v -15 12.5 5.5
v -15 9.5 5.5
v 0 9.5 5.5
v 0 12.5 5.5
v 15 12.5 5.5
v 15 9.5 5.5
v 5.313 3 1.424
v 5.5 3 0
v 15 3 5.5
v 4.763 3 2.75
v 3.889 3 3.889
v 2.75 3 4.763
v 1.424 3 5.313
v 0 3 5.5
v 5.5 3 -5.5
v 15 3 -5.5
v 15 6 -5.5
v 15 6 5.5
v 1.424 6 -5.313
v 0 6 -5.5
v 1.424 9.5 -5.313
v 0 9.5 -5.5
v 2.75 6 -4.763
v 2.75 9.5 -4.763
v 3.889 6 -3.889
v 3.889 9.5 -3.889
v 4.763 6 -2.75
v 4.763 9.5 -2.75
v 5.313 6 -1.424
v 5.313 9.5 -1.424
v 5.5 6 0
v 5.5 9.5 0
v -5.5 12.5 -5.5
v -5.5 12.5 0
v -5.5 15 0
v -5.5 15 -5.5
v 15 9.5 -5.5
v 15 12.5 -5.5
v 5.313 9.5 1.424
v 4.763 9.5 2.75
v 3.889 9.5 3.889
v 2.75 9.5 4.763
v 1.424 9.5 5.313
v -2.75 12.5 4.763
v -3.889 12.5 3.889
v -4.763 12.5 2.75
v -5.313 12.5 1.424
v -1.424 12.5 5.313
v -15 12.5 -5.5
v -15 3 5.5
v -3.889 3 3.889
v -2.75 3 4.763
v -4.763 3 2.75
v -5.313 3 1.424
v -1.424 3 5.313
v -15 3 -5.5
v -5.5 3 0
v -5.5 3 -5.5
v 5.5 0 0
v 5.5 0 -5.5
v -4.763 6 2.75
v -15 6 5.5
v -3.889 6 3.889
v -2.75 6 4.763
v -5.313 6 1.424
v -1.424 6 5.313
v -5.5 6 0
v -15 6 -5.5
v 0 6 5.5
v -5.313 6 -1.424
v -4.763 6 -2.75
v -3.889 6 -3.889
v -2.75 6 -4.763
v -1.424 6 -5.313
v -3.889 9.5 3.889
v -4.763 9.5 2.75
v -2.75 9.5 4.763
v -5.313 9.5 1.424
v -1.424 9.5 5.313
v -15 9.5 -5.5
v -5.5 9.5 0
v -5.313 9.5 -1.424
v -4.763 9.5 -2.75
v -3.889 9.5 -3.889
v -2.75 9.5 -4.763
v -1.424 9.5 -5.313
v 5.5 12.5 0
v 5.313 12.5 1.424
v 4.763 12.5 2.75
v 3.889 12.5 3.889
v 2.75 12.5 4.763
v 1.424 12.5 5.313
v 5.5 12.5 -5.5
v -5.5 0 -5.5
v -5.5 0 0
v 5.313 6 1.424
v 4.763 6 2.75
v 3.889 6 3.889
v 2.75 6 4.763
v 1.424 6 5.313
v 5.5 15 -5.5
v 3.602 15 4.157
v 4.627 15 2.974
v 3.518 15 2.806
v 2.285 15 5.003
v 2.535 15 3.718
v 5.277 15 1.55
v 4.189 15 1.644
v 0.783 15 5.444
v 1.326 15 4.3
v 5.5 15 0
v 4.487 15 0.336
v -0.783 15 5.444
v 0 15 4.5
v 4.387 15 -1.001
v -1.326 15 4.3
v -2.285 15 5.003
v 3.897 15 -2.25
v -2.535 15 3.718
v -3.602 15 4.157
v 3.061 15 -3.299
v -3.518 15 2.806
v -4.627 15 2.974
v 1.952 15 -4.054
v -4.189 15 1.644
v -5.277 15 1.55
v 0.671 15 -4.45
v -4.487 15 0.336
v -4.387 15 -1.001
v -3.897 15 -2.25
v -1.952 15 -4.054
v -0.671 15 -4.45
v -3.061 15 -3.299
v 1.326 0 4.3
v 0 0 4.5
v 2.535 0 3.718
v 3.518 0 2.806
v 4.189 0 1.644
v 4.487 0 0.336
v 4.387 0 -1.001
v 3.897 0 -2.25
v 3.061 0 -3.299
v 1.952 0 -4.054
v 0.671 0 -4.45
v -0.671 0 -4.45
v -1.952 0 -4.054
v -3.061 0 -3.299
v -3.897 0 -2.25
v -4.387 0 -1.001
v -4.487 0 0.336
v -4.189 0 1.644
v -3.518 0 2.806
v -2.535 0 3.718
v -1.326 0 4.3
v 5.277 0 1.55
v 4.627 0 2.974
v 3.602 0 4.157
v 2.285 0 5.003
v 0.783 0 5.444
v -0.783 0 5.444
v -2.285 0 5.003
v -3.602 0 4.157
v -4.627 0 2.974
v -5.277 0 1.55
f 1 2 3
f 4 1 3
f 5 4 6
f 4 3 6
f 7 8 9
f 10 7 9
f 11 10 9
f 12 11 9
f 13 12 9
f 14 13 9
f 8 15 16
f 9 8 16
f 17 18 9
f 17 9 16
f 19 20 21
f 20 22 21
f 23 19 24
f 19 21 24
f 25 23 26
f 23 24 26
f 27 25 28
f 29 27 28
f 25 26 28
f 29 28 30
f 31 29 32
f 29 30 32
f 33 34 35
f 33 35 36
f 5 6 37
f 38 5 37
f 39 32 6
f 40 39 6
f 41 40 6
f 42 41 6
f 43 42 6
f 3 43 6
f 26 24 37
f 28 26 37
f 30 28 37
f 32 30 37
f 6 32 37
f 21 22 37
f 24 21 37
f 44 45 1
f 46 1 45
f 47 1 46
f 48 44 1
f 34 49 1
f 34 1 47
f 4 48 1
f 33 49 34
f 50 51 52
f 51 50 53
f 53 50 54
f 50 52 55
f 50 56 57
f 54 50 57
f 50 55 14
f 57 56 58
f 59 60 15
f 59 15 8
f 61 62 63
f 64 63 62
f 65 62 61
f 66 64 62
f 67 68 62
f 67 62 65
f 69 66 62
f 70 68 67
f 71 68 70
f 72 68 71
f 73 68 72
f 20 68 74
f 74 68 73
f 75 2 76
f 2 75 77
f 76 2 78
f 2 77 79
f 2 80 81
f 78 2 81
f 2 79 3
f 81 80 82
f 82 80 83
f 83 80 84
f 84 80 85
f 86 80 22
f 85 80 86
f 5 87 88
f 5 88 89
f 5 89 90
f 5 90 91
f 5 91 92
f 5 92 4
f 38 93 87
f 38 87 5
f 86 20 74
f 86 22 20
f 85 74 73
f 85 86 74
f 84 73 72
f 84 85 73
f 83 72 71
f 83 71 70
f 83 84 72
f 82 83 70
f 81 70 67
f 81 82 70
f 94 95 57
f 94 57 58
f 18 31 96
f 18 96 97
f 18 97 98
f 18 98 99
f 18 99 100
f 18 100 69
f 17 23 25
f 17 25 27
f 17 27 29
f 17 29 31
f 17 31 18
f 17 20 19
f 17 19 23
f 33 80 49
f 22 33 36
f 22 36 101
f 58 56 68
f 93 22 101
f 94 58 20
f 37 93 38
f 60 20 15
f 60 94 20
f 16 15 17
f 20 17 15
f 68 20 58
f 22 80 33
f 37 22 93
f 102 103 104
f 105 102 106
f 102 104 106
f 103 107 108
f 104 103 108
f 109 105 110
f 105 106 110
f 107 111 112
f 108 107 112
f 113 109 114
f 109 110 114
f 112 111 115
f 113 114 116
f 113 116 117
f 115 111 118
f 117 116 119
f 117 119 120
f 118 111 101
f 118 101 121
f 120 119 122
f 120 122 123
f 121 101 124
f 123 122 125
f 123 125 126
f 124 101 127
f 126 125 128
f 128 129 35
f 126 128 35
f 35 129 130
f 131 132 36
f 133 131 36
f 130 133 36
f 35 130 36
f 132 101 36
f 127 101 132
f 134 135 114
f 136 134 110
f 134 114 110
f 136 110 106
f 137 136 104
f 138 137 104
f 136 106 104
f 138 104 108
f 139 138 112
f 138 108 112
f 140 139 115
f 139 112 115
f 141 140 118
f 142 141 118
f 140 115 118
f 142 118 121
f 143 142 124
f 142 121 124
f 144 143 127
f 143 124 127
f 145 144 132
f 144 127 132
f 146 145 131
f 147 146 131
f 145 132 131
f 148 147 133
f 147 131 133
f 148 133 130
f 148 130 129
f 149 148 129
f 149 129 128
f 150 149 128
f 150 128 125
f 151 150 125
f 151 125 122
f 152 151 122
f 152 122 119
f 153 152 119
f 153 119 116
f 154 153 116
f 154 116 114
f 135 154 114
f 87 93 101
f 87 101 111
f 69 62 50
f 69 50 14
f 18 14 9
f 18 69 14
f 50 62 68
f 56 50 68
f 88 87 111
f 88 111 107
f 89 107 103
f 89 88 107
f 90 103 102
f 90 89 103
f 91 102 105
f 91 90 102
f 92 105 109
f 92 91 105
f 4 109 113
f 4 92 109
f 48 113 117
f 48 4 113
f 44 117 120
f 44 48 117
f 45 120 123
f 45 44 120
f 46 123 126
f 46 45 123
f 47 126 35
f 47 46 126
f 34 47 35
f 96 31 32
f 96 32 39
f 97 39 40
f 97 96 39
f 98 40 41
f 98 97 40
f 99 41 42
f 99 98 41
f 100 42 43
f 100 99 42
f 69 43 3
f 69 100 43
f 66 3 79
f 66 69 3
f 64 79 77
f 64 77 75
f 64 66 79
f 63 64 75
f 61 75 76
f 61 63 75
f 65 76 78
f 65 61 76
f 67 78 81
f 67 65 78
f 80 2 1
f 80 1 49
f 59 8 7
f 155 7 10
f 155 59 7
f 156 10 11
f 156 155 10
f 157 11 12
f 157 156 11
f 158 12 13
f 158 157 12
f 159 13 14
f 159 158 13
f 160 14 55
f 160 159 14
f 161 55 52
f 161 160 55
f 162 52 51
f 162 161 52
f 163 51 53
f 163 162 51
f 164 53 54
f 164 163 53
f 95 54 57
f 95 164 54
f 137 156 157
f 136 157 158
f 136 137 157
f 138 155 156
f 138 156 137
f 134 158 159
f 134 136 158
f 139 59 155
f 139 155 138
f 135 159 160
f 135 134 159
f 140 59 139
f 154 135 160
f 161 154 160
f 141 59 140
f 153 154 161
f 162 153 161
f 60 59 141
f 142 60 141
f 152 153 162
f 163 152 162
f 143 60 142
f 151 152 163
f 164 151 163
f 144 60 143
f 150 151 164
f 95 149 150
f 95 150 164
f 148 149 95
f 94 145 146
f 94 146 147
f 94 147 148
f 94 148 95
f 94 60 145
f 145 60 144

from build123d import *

# Parameters (mm, degrees)
SALIENTE_EXTRUIR1_DEPTH = 15
SALIENTE_EXTRUIR2_START = -9
CROQUIS2_W              = 30
CROQUIS2_H              = 11
SALIENTE_EXTRUIR2_DEPTH = 3
SALIENTE_EXTRUIR3_START = 3.5
CROQUIS3_W              = 30
CROQUIS3_H              = 11
SALIENTE_EXTRUIR3_DEPTH = 3
CROQUIS4_R              = 4.5
CORTAR_EXTRUIR1_DEPTH   = 22.914607001
REDONDEO6_R             = 5.5
REDONDEO7_R             = 5.5


with BuildPart() as part:
    # Croquis1 → Saliente-Extruir1 (new body)
    with BuildSketch(Plane(origin=(0, 0, 0), x_dir=(1, 0, 0), z_dir=(0, 1, 0))):
        with BuildLine():
            Line((-5.5, 0), (-5.5, 5.5))
            Line((-5.5, 5.5), (5.5, 5.5))
            Line((5.5, 5.5), (5.5, 0))
            ThreePointArc((5.5, 0), (0, -5.5), (-5.5, 0))
        make_face()
    extrude(amount=SALIENTE_EXTRUIR1_DEPTH)

    # Croquis2 → Saliente-Extruir2 (add)
    with BuildSketch(Plane(origin=(0, 15, 0), x_dir=(1, 0, 0), z_dir=(0, 1, 0)).offset(SALIENTE_EXTRUIR2_START)):
        Rectangle(CROQUIS2_W, CROQUIS2_H)
    extrude(amount=-SALIENTE_EXTRUIR2_DEPTH)

    # Croquis3 → Saliente-Extruir3 (add)
    with BuildSketch(Plane(origin=(0, 6, 0), x_dir=(1, 0, 0), z_dir=(0, 1, 0)).offset(SALIENTE_EXTRUIR3_START)):
        Rectangle(CROQUIS3_W, CROQUIS3_H)
    extrude(amount=SALIENTE_EXTRUIR3_DEPTH)

    # Croquis4 → Cortar-Extruir1 (cut, through all)
    with BuildSketch(Plane(origin=(0, 15, 0), x_dir=(1, 0, 0), z_dir=(0, 1, 0))):
        with Locations(Location((0, 0, 0), (0, 0, 270))):
            Circle(CROQUIS4_R)
    extrude(amount=-CORTAR_EXTRUIR1_DEPTH, mode=Mode.SUBTRACT)

    # Redondeo6
    redondeo6_edges = [part.edges().sort_by_distance(p)[0] for p in [
        (-5.5, 7.75, -5.5),
    ]]
    fillet(redondeo6_edges, radius=REDONDEO6_R - 0.0001)  # a hair under: the kernel refuses the full size

    # Redondeo7
    redondeo7_edges = [part.edges().sort_by_distance(p)[0] for p in [
        (5.5, 7.75, -5.5),
    ]]
    fillet(redondeo7_edges, radius=REDONDEO7_R - 0.0001)  # a hair under: the kernel refuses the full size


solid = part.part
